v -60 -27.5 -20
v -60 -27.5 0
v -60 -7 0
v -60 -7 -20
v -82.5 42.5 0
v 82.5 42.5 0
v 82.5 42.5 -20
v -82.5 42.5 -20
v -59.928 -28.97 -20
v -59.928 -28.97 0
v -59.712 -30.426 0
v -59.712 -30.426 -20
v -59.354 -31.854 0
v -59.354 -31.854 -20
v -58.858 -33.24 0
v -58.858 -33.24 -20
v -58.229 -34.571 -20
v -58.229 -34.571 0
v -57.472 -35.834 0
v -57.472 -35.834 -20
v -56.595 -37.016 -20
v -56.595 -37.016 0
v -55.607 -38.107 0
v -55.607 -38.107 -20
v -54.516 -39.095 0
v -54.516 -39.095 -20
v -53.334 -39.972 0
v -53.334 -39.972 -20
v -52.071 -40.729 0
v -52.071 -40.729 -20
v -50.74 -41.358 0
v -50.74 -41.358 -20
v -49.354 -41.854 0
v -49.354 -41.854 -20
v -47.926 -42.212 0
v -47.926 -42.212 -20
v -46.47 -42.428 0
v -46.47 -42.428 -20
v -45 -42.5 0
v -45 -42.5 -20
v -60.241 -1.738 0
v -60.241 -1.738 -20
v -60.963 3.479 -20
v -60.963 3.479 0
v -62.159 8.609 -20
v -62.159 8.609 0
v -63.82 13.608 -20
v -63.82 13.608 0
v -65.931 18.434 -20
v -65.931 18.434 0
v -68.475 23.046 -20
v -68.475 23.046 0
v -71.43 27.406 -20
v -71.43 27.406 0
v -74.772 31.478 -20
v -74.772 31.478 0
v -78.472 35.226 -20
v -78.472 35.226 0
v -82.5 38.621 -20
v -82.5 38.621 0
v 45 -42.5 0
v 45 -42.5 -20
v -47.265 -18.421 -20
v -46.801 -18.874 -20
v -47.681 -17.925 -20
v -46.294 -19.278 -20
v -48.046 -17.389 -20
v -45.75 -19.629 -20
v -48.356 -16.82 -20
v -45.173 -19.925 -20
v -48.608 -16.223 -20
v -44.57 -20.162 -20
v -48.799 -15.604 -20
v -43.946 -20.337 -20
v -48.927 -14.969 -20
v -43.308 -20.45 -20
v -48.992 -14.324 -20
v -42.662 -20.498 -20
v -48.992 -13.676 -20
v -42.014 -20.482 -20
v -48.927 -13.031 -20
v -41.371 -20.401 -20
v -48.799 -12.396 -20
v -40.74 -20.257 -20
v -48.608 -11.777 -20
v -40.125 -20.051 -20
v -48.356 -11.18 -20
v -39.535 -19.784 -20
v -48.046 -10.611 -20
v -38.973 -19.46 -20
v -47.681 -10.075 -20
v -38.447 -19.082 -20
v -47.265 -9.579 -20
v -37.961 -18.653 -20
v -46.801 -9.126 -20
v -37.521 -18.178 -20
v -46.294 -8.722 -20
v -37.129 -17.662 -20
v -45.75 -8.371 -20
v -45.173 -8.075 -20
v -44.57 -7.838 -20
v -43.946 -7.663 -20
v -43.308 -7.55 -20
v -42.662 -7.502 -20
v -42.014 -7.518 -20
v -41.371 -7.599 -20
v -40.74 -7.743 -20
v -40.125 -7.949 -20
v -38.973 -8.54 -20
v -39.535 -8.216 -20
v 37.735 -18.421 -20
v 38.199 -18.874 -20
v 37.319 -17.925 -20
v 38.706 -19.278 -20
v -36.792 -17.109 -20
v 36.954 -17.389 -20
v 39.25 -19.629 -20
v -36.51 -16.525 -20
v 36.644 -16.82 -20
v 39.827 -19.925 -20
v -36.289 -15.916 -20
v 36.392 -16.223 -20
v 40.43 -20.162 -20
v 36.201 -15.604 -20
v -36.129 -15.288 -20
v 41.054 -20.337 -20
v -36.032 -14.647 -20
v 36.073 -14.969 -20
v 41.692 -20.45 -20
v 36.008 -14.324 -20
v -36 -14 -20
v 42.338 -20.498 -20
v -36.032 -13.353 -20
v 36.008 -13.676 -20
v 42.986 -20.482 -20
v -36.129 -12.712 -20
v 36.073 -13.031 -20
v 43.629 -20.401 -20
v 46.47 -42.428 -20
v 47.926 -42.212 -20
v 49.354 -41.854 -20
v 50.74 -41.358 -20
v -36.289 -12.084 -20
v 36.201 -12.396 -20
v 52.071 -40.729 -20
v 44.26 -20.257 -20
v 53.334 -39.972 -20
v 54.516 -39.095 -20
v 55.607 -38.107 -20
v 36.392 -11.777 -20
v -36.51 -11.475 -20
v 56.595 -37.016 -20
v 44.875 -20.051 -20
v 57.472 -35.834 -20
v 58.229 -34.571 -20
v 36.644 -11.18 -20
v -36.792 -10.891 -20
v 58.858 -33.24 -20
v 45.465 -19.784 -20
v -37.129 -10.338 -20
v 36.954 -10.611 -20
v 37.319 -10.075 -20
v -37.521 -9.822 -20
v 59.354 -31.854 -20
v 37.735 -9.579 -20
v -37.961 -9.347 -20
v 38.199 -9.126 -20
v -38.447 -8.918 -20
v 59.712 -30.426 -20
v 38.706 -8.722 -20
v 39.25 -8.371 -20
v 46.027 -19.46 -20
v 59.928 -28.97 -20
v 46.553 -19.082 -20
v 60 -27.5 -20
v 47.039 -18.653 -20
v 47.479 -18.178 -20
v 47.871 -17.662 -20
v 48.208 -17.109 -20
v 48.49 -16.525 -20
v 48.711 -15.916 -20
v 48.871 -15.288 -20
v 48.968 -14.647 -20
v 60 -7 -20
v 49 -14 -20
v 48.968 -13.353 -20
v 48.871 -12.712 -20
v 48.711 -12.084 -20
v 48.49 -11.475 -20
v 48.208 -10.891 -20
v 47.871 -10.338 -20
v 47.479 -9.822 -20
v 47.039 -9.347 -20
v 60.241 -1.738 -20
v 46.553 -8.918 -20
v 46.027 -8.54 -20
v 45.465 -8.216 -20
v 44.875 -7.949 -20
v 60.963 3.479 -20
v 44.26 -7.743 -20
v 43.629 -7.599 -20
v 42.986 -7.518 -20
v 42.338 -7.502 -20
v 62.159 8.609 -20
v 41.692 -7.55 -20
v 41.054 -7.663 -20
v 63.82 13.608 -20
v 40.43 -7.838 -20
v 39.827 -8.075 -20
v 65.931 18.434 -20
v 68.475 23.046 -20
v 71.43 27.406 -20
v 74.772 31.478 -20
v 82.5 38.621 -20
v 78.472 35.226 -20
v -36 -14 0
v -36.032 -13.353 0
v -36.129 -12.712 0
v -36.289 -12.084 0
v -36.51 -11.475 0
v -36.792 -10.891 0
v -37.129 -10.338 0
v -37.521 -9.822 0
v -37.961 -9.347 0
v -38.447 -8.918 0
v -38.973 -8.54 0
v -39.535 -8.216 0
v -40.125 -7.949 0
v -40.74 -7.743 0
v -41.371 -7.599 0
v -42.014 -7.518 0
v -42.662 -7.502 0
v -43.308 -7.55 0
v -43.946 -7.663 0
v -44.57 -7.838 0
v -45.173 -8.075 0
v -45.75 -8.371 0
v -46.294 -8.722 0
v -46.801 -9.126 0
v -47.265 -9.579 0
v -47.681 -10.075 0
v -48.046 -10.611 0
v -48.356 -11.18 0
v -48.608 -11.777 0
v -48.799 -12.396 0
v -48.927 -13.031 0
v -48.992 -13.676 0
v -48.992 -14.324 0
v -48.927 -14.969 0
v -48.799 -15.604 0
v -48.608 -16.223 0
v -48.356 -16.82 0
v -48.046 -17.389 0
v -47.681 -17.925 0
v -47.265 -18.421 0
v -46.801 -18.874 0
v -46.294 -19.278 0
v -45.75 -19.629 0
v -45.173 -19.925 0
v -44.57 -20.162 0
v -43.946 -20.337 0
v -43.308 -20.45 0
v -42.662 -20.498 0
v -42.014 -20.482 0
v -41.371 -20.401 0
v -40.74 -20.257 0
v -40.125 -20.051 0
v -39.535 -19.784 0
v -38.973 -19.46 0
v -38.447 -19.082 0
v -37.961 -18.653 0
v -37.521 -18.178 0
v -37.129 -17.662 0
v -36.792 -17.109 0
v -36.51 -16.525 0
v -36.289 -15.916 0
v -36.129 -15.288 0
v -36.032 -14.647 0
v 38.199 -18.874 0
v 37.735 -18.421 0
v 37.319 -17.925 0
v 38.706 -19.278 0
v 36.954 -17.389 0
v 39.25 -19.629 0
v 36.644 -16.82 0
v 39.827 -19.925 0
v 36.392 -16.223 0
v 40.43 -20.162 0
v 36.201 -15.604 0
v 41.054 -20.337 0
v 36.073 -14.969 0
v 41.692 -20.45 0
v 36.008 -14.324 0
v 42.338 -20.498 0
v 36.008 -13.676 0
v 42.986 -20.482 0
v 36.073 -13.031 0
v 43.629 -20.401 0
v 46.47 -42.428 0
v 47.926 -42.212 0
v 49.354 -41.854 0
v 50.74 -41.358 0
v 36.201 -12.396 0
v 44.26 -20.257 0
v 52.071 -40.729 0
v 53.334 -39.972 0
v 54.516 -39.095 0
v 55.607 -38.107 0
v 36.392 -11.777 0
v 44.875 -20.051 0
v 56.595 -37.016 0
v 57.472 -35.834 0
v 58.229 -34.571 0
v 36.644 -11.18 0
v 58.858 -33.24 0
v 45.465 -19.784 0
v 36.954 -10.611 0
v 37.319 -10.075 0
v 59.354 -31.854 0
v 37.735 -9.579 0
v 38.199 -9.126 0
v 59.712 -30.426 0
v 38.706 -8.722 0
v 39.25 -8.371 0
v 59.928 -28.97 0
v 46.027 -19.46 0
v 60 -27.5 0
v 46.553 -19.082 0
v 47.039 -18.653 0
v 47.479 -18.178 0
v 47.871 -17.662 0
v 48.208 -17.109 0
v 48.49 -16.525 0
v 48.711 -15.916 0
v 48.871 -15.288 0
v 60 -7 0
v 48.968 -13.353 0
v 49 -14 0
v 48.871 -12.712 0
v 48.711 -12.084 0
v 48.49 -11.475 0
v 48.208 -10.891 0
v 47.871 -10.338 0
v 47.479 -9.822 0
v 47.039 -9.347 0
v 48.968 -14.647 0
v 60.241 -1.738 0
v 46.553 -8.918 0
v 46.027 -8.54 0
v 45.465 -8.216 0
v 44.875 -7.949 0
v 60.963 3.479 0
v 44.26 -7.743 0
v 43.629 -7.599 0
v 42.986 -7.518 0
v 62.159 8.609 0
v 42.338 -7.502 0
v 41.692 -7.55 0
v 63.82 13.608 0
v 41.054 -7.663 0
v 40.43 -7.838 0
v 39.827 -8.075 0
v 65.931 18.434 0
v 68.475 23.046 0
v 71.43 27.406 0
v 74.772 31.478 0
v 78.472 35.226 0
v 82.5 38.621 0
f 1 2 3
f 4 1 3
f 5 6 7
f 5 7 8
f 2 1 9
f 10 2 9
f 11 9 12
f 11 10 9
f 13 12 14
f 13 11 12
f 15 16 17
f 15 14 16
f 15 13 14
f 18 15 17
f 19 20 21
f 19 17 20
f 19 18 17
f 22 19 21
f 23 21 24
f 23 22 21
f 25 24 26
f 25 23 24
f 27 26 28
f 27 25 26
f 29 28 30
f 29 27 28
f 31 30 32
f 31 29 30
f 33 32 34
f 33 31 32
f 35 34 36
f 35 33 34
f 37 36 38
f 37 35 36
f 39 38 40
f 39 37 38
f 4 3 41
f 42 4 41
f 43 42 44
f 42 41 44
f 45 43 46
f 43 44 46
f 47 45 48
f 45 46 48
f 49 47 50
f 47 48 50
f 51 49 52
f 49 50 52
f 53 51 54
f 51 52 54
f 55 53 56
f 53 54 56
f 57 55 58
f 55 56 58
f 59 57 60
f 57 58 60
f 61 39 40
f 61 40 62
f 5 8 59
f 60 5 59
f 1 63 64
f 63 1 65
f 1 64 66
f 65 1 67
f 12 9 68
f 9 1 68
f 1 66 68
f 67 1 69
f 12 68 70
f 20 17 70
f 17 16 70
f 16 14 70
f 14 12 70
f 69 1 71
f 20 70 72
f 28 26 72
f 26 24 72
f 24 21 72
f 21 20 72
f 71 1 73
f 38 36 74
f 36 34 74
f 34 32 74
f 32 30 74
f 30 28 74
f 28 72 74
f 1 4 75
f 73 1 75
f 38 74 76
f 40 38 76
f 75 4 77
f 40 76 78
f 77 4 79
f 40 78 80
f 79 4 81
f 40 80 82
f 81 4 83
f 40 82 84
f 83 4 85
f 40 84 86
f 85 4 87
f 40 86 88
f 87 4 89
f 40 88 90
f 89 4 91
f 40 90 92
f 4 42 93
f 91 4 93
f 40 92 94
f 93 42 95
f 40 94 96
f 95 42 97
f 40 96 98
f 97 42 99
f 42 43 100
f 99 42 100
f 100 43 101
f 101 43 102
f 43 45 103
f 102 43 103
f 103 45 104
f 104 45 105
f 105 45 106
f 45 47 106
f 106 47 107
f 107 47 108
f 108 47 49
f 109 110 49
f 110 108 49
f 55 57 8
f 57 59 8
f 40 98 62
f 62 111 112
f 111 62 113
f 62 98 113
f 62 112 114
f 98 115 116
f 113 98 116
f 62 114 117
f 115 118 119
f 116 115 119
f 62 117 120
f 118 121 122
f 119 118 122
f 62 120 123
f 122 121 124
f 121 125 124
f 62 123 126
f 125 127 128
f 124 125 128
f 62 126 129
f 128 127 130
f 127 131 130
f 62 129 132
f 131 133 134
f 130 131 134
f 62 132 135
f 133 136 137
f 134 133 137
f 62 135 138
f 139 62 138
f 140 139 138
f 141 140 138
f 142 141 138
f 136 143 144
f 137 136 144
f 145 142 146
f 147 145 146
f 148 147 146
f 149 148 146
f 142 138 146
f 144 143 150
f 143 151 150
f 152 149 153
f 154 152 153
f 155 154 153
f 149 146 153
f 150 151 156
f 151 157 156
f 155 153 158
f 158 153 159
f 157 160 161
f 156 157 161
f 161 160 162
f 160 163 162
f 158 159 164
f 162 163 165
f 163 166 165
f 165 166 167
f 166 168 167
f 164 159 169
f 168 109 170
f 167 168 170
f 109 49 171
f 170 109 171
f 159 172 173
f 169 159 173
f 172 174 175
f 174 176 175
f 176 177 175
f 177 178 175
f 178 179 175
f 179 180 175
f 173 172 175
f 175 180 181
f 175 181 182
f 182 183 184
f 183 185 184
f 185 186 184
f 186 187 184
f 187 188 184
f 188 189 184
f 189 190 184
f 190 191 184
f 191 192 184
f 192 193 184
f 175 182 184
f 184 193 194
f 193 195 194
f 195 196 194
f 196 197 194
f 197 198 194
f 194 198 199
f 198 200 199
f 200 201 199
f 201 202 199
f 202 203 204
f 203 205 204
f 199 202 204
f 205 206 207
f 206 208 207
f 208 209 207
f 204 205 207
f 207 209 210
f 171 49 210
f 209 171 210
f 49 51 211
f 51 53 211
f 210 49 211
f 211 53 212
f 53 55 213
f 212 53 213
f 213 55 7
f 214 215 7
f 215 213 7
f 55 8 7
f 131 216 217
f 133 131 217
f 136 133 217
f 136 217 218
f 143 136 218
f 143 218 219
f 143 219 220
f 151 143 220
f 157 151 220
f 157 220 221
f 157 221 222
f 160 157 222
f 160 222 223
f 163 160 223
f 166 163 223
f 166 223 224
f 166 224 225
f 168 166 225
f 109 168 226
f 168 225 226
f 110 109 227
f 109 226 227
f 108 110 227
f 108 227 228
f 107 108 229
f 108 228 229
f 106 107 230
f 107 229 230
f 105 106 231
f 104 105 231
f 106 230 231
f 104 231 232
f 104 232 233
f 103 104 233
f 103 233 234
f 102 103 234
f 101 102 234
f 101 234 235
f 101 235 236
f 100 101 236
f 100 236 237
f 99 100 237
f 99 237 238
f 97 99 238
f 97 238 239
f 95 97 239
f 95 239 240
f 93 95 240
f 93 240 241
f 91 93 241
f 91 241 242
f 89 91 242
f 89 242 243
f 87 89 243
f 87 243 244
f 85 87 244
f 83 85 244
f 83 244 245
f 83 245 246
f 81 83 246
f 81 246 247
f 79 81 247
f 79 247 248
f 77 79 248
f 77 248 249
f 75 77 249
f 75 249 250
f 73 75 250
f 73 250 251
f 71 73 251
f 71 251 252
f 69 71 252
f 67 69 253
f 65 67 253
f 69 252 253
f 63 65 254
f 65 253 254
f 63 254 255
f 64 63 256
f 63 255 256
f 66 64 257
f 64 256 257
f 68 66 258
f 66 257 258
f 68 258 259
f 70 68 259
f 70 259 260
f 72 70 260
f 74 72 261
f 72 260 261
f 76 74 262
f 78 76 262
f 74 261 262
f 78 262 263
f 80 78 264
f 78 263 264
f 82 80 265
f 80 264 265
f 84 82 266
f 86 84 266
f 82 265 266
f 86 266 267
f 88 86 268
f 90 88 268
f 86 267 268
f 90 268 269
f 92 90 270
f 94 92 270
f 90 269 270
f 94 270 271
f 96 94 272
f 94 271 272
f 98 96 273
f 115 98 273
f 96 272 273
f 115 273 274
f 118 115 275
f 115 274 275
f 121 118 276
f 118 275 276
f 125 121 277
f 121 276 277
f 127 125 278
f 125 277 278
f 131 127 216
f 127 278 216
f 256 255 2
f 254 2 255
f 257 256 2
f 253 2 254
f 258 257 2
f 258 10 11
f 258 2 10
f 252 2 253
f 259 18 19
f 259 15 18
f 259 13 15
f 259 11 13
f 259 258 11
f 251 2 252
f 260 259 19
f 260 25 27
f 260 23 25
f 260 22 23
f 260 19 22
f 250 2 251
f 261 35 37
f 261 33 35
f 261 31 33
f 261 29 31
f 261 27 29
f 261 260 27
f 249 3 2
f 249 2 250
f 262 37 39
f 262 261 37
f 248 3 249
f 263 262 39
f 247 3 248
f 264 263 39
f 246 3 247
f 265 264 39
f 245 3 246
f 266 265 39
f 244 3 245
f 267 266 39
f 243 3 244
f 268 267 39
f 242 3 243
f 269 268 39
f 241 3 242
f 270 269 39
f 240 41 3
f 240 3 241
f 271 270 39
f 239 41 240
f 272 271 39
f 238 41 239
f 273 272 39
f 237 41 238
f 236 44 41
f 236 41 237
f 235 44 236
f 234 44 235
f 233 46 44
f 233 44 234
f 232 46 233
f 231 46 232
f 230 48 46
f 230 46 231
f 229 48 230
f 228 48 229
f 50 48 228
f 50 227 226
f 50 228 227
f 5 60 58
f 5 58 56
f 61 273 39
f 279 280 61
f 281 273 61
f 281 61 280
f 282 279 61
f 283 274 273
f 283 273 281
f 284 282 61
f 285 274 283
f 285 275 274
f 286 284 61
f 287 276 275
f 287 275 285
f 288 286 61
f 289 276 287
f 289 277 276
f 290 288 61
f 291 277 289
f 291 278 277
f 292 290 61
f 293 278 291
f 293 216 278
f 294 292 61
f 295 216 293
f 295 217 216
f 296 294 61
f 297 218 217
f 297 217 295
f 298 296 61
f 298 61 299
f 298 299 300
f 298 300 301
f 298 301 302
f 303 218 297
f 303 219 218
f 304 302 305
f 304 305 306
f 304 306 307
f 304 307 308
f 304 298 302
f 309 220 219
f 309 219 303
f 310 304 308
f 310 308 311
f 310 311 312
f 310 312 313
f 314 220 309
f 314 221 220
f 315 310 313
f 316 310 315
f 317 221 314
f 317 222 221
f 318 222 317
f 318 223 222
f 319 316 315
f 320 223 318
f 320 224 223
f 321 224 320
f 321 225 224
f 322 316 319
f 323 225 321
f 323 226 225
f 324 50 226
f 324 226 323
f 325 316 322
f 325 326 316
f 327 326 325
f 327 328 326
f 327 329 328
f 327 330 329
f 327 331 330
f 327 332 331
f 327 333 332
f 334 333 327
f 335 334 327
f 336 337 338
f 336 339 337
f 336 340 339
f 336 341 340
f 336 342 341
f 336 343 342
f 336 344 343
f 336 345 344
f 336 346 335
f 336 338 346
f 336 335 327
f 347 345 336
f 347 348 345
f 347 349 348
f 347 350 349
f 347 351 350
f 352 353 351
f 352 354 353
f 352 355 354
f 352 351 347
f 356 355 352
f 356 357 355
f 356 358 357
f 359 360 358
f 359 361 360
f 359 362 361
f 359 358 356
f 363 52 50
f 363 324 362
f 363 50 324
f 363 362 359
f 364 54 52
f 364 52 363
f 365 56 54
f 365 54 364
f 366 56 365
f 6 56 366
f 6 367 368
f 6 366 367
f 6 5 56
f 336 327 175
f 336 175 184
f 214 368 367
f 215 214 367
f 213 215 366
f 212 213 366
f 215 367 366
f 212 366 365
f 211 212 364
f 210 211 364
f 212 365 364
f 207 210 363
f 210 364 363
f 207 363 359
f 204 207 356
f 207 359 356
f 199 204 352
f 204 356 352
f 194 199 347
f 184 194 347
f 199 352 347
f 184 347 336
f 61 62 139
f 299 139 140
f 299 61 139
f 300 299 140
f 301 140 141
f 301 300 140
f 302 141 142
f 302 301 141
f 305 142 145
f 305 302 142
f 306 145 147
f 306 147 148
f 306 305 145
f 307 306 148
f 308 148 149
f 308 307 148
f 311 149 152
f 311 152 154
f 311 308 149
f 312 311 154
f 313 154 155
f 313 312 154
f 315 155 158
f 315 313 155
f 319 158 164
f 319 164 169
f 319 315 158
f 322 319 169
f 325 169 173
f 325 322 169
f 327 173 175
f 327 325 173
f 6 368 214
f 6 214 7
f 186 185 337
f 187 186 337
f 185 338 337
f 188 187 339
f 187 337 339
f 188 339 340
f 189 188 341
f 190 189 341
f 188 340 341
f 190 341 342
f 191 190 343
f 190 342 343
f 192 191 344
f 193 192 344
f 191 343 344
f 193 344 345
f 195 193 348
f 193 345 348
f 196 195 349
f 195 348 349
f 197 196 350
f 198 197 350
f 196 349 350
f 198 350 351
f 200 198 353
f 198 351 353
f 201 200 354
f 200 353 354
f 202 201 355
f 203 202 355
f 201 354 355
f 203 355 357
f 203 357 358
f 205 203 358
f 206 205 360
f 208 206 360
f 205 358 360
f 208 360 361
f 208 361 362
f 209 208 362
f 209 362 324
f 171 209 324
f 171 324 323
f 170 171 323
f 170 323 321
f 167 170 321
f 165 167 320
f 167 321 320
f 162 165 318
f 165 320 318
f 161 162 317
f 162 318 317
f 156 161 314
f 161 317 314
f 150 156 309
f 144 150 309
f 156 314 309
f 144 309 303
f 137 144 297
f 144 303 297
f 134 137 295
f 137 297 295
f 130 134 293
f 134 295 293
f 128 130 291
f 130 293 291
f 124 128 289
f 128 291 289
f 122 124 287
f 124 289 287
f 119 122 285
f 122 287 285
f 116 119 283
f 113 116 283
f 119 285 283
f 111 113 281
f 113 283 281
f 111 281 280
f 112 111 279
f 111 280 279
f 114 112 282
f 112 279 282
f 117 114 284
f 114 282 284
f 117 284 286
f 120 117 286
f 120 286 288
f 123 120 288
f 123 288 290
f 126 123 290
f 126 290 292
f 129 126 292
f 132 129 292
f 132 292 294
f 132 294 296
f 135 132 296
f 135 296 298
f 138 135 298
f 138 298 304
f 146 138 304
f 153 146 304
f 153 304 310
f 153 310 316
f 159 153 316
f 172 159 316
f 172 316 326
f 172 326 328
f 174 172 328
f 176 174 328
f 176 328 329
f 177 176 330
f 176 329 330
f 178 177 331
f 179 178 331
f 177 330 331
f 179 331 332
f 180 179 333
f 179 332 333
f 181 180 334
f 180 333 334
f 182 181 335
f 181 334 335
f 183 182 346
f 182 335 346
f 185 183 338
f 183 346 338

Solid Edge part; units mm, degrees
sketch "Sketch1" plane through (0, 0, 0) normal (0, 0, 1) x (1, 0, 0)
  line L0 (-82.5, -42.5) -> (82.5, -42.5)
  line L1 (82.5, -42.5) -> (82.5, 42.5)
  line L2 (82.5, 42.5) -> (-82.5, 42.5)
  line L3 (-82.5, 42.5) -> (-82.5, -42.5)
extrude "Protrusion1" add sketch "Sketch1" against normal blind 20
sketch "Sketch2" plane through (0, 0, 0) normal (0, 0, 1) x (1, 0, 0)
  circle A0 centre (-42.5, -14) radius 6.5
  circle A1 centre (-117.5, -7) radius 57.5
extrude "ExtrudedCutout_1" cut sketch "Sketch2" against normal blind 20
sketch "Sketch3" plane through (0, 0, 0) normal (0, 0, 1) x (1, 0, 0)
  circle A0 centre (117.5, -7) radius 57.5
  circle A1 centre (42.5, -14) radius 6.5
extrude "ExtrudedCutout_2" cut sketch "Sketch3" against normal blind 20
sketch "Sketch4" plane through (0, 0, 0) normal (0, 0, 1) x (1, 0, 0)
  line L0 (60, -7) -> (82.5, -7)
  line L1 (82.5, -7) -> (82.5, -50.0706)
  line L2 (82.5, -50.0706) -> (60, -50.0706)
  line L3 (60, -50.0706) -> (60, -7)
  line L4 (-60, -7) -> (-88.75, -7)
  line L5 (-88.75, -7) -> (-88.75, -50.6186)
  line L6 (-88.75, -50.6186) -> (-60, -50.6186)
  line L7 (-60, -50.6186) -> (-60, -7)
extrude "ExtrudedCutout_3" cut sketch "Sketch4" against normal blind 20
fillet "Round_2" radius 15 2 edges at (60, -42.5, -10) (-60, -42.5, -10)
